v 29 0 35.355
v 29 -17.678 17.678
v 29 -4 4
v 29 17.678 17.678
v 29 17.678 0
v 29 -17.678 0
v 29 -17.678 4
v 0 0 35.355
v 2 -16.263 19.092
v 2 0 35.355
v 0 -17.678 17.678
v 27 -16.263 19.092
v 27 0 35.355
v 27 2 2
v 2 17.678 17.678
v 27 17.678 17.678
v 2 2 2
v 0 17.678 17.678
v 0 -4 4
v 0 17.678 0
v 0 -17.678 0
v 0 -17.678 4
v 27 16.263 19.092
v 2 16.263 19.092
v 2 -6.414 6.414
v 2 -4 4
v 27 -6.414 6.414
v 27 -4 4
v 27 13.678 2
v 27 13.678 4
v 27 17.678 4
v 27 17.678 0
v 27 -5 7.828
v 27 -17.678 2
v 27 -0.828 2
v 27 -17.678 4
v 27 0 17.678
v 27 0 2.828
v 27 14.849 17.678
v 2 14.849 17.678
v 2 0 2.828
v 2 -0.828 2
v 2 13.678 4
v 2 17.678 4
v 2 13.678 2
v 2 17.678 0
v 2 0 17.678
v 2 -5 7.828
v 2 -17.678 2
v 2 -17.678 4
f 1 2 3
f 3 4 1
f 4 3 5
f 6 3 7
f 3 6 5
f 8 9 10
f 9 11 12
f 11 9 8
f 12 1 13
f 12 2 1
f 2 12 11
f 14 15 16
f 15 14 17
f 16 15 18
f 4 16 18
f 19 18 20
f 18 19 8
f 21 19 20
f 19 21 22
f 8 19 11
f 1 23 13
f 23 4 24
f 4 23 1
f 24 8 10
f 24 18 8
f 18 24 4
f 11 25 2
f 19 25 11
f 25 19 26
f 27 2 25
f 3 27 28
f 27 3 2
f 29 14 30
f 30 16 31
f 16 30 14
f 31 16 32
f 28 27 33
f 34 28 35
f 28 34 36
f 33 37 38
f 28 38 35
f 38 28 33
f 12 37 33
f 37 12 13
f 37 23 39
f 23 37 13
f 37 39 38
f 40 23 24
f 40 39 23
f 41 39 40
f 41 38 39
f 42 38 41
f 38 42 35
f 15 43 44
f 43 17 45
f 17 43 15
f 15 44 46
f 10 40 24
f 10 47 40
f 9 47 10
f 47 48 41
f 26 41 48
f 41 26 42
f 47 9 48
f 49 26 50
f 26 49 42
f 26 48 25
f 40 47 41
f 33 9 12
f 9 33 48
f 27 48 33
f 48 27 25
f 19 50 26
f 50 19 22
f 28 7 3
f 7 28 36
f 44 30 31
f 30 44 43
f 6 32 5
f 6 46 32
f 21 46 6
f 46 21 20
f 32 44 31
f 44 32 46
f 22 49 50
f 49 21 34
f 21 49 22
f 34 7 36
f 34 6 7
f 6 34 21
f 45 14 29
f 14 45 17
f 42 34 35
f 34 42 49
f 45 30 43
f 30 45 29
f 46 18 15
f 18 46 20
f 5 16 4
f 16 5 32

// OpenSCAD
width = 25;
maxdiameter = 50;
thickness = 2;
wirethickness = 5/sin(45);

length=sqrt(2*(maxdiameter/2*maxdiameter/2));

rotate([45]) {
  difference() {
    cube([width + 2*thickness, maxdiameter/2, maxdiameter/2]);
    translate([thickness,thickness,thickness]) cube([width, maxdiameter/2, maxdiameter/2]);
    translate([thickness,-1,thickness]) cube([width, thickness+2, wirethickness]);
  }
}

translate([0,-length/2,0]) difference() {
  cube([width+2*thickness,length,2*thickness]);
  translate([thickness,-1,thickness]) cube([width,length-thickness-1,thickness+1]);
}

cube([thickness,length/2,length/2]);
translate([width+thickness,0,0]) cube([thickness,length/2,length/2]);
